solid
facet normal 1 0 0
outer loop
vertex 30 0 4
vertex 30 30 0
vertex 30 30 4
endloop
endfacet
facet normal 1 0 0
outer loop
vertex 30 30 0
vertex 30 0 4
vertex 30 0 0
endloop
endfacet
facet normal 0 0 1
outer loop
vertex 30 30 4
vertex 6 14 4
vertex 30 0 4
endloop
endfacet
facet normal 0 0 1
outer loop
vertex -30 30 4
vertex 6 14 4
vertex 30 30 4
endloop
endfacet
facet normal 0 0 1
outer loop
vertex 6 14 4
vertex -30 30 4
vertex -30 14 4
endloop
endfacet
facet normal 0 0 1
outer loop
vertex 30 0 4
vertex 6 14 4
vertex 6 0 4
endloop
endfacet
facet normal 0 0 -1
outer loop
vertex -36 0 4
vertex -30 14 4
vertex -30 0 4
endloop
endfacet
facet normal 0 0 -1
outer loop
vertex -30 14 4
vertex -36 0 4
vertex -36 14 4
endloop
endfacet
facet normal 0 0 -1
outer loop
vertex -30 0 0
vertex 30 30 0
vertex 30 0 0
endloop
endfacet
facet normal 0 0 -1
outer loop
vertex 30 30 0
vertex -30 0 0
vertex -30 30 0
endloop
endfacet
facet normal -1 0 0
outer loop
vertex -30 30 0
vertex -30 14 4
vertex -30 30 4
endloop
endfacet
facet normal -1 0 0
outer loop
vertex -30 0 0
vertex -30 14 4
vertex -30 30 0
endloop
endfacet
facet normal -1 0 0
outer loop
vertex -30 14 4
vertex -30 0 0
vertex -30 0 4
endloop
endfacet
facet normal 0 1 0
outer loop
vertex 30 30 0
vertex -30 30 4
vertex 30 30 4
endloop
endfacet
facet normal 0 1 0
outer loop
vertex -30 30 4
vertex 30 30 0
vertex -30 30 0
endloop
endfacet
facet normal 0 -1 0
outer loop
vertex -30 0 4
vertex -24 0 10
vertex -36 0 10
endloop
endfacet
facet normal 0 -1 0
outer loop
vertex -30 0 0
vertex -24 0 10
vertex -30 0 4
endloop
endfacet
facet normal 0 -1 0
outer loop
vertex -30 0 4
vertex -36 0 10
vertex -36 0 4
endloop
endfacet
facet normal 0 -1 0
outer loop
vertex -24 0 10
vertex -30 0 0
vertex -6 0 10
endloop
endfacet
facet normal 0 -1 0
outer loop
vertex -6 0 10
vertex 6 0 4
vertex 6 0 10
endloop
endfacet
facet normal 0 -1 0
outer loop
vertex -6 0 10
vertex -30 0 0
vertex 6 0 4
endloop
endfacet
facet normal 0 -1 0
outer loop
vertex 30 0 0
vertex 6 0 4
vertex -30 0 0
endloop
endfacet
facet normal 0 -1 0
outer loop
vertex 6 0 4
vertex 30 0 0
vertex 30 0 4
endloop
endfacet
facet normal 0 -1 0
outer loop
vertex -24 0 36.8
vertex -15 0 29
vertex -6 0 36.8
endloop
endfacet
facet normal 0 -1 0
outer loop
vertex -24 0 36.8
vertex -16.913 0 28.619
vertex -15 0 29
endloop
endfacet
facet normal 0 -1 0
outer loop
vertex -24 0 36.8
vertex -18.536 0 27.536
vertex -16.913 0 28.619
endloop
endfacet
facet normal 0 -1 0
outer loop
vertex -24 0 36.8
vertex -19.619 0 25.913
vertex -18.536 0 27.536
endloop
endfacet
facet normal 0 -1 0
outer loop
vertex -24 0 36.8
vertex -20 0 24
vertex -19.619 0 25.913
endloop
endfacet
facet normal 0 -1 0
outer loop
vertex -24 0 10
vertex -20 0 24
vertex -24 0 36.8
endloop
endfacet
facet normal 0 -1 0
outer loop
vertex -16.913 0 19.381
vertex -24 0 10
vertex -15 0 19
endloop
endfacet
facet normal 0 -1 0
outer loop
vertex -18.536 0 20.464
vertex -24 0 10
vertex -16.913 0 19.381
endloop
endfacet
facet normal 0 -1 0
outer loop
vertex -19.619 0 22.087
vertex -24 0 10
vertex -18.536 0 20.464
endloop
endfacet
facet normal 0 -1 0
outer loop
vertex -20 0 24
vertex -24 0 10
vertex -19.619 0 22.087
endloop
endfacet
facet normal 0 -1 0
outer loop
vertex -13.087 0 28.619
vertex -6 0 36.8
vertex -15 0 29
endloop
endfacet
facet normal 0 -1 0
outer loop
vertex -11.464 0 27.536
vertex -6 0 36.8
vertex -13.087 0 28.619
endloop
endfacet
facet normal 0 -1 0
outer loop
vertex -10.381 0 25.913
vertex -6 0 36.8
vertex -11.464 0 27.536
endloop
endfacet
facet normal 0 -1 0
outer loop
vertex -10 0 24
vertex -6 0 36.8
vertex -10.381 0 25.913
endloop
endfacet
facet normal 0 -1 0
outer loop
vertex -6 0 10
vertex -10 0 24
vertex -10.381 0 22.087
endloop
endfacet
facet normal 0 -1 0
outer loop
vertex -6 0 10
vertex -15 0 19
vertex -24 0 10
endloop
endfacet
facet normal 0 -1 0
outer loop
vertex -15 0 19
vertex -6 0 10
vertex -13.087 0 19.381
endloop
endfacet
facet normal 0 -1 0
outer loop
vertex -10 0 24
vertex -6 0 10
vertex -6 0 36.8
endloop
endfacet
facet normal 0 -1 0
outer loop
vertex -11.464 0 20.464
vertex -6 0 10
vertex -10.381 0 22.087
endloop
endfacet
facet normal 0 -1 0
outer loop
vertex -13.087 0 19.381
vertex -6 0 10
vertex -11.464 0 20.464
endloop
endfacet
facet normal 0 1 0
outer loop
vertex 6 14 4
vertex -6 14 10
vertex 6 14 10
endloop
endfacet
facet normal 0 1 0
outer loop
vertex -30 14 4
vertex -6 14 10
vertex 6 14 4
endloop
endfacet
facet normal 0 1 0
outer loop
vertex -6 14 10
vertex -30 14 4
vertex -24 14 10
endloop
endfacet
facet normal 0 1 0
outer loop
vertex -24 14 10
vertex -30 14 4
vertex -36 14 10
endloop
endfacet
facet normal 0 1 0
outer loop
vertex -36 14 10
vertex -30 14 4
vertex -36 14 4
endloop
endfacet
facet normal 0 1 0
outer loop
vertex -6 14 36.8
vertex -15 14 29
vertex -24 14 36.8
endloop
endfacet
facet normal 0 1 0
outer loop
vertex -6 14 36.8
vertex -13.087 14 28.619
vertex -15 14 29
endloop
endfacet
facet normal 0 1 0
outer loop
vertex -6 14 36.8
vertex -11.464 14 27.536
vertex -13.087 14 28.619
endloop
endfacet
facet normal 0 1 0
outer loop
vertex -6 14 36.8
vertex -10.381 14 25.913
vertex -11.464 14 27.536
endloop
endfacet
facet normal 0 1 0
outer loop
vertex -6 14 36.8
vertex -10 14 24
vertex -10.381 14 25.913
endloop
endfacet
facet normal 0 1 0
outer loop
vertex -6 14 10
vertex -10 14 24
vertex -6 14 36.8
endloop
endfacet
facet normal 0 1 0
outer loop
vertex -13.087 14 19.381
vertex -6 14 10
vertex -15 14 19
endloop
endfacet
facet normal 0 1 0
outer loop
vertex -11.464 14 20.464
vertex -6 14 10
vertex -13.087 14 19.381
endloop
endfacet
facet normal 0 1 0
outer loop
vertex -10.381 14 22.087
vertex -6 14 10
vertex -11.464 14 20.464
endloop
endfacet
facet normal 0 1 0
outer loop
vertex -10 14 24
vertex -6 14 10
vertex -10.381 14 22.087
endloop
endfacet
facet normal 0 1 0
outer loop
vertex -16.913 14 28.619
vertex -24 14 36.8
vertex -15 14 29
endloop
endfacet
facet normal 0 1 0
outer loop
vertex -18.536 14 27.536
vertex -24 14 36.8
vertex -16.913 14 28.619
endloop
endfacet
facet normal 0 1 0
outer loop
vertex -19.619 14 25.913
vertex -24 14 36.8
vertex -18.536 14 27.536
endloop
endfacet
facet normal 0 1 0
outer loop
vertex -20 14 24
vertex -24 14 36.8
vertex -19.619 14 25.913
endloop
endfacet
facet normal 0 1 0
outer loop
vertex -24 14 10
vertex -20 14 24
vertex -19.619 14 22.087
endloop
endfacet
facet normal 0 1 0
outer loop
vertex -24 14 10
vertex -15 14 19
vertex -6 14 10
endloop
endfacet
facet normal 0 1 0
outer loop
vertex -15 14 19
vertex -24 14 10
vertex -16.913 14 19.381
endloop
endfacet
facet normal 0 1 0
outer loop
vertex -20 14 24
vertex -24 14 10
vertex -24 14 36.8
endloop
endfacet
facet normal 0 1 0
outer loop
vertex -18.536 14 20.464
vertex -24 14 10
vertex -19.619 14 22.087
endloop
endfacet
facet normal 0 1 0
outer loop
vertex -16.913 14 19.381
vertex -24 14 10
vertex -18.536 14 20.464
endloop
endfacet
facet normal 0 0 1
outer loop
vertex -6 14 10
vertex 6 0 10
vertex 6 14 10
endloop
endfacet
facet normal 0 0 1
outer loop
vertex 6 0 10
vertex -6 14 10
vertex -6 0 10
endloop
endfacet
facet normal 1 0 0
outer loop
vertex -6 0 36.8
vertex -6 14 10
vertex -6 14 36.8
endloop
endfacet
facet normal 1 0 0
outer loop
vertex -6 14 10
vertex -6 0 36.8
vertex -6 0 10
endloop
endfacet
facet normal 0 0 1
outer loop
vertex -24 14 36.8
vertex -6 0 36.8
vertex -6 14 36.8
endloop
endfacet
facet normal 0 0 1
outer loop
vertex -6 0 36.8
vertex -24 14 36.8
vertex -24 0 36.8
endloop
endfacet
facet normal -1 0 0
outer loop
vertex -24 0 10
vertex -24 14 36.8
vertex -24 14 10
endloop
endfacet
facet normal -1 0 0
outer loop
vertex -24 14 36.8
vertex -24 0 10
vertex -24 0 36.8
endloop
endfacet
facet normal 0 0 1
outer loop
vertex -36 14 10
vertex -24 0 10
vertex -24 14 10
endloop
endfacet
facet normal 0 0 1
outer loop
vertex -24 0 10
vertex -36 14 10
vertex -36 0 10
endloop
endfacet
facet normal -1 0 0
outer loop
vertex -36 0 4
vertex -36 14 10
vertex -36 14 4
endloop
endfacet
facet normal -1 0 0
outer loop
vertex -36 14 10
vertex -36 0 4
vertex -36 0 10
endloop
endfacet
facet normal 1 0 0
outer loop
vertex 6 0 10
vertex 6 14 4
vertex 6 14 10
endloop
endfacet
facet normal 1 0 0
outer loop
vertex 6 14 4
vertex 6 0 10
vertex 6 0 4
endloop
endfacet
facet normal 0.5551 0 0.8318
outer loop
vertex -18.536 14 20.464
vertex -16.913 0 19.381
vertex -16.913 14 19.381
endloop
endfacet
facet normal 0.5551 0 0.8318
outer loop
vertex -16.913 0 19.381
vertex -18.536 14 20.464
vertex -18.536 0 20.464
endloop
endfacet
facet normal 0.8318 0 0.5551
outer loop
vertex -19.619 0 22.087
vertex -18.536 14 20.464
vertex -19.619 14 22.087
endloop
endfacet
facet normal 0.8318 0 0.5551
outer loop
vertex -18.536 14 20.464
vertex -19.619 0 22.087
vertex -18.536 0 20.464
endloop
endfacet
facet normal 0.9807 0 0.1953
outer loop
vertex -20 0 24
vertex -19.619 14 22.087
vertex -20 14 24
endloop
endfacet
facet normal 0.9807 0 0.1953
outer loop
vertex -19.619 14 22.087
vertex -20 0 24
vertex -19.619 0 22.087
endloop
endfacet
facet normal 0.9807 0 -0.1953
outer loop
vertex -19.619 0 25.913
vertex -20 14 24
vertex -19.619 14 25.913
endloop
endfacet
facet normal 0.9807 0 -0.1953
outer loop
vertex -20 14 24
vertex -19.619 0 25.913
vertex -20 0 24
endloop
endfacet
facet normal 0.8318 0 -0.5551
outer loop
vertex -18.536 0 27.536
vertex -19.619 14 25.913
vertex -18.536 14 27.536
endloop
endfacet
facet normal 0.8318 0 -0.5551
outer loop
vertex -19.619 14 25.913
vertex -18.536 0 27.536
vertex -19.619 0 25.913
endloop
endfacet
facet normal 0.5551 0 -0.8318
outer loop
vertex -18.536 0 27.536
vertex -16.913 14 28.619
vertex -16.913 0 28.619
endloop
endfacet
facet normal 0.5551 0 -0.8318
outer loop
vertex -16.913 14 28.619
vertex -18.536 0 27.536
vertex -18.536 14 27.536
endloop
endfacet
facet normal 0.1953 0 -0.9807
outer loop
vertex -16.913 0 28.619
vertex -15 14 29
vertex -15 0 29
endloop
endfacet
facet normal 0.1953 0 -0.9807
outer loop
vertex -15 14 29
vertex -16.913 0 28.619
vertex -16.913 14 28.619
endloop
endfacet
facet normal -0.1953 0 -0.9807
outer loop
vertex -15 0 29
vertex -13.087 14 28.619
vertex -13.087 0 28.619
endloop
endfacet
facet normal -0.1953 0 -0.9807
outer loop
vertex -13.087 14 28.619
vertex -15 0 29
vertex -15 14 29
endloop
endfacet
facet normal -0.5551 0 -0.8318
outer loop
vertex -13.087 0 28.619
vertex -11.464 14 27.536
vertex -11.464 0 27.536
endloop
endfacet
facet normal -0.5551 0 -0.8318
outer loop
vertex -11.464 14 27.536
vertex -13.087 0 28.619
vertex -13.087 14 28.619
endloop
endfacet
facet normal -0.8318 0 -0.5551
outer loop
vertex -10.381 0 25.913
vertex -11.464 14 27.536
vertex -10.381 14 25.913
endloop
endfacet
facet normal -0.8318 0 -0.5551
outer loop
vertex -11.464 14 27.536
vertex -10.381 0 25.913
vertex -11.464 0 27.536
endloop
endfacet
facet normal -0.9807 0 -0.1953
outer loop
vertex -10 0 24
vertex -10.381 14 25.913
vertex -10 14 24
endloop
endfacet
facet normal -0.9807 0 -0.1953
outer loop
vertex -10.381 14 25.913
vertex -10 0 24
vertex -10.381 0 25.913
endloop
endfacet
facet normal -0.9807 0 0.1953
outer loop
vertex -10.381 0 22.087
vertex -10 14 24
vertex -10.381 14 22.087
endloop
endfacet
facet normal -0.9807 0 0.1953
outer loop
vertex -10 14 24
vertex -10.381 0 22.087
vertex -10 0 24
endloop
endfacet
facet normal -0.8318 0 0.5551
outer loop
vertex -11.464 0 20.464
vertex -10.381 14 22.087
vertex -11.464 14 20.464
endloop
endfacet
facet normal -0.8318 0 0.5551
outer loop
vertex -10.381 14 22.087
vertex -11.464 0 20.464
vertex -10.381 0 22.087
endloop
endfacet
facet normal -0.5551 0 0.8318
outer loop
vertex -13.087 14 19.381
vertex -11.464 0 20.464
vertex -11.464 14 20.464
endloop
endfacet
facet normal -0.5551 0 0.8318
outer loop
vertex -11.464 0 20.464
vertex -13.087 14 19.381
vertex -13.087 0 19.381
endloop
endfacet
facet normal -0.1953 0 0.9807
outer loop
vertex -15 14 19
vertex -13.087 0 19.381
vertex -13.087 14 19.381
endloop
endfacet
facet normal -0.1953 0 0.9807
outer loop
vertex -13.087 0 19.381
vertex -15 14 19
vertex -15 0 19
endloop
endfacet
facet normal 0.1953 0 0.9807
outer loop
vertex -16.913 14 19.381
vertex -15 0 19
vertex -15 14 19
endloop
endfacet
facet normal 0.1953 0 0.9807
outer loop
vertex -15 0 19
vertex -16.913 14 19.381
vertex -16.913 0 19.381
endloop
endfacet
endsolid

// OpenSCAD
// file: library/Profile30.scad
// project		: mT-101
// parts 		: profile (profile30_width 30mm)
// printable 	: yes

// author 		: vincent
// date   		: 6.20.2013

// www.metarobotics.com
// It is licensed under the Creative Commons - GNU GPL license.

profile30_width=30;

//simple usage
//profile30(length=100,female=false);

module profile30_inner_slice()
{
	w1=10.3;
	w2=6.3;
	height=10.5;
	margin_corner=3;
	marginy=2;

	margin2 = (w1-w2)/2;
	array1=[[0,height],[0,height-marginy],[margin2,height-marginy],[margin2,height]];
	array2=[[w1,height],[w1,height-marginy],[w1-margin2,height-marginy],[w1-margin2,height]];

	difference()
	{
		polygon(points=[[0,0],[w1,0],[w1,height],[0,height]]);
		polygon(points=[[0,0],[0,margin_corner],[margin_corner,0]]);
		polygon(points=[[w1,0],[w1,margin_corner],[w1-margin_corner,0]]);
		polygon(points=array1);
		polygon(points=array2);
	}
}

module profile_slice30(length=100,female=true)
{
	inner_w=20;
	hole_dia=3;
	center_dia=5;

	margin1=(profile30_width-inner_w)/2;
	margin2=4;
	inner_slice_w=10.3;
	inner_slice_h=10.5;
	socket_length=6;

	translate([-profile30_width/2,-profile30_width/2,0])
	linear_extrude(height=length,center=true)
	difference()
	{
		square(profile30_width,profile30_width);
		translate([profile30_width/2-inner_slice_w/2,profile30_width-inner_slice_h,0]) profile30_inner_slice();
		translate([inner_slice_h,profile30_width/2-inner_slice_w/2,0]) rotate([0,0,90]) profile30_inner_slice();
		translate([profile30_width-inner_slice_w,inner_slice_h,0]) rotate([0,0,180]) profile30_inner_slice();
		translate([profile30_width-inner_slice_h,profile30_width/2+inner_slice_w/2,0]) rotate([0,0,270]) profile30_inner_slice();

		//hole
		translate([margin1,margin1]) circle(r=hole_dia);
		translate([margin1,profile30_width-margin1]) circle(r=hole_dia);
		translate([profile30_width-margin1,margin1]) circle(r=hole_dia);
		translate([profile30_width-margin1,profile30_width-margin1]) circle(r=hole_dia);
		translate([profile30_width/2,profile30_width/2]) circle(r=center_dia/2);
	}

	if(female==false)
	{
		//socket
		translate([-profile30_width/2,-profile30_width/2,length/2])
		difference()
		{
			union()
			{
				linear_extrude(height=2*socket_length,center=true)
				union()
				{
					translate([margin1,margin1]) circle(r=hole_dia);
					translate([margin1,profile30_width-margin1]) circle(r=hole_dia);
					translate([profile30_width-margin1,margin1]) circle(r=hole_dia);
					translate([profile30_width-margin1,profile30_width-margin1]) circle(r=hole_dia);
				}

				translate([0,0,socket_length])
				union()
				{
					translate([margin1,margin1]) cylinder(h=socket_length/2,r1=hole_dia,r2=hole_dia/2);
					translate([margin1,profile30_width-margin1]) cylinder(h=socket_length/2,r1=hole_dia,r2=hole_dia/2);
					translate([profile30_width-margin1,margin1]) cylinder(h=socket_length/2,r1=hole_dia,r2=hole_dia/2);
					translate([profile30_width-margin1,profile30_width-margin1]) cylinder(h=socket_length/2,r1=hole_dia,r2=hole_dia/2);
				}
			}

			translate([0,0,-socket_length-0.01])
			union()
			{
				translate([margin1,margin1]) cylinder(h=socket_length/2,r1=hole_dia,r2=hole_dia/2);
				translate([margin1,profile30_width-margin1]) cylinder(h=socket_length/2,r1=hole_dia,r2=hole_dia/2);
				translate([profile30_width-margin1,margin1]) cylinder(h=socket_length/2,r1=hole_dia,r2=hole_dia/2);
				translate([profile30_width-margin1,profile30_width-margin1]) cylinder(h=socket_length/2,r1=hole_dia,r2=hole_dia/2);
			}
		}
	}
}

module profile30(length=100,female=true,isPrintable=true) {
	$fa = 1;
	$fn = 40;
	profile_slice30(length=length,female=female);
}
// file: library/linearShaft.scad
module linearShaft( h, r )
{
	cylinder( h=h,r=r, center=true );
}
// file: frame/assembleProfile.scad
// project		: mT-101
// printable 	: yes

// assembles parts
// profile30 height=10 * 6 * 4;
// profile_L_bracket=15;

// author 		: vincent
// date   		: 6.20.2013

// www.metarobotics.com
// It is licensed under the Creative Commons - GNU GPL license.

include <../library/Profile30.scad>

//factors
profile_length=100;
apart_factor = 0.01;

bottom_length_x = 600;
bottom_length_y = 600;
bottom_length_z = 600;

module zaxes(apart=false)
{
	union()
	{
		translate([-profile30_width/2,profile30_width/2,profile_length/2])
		bottom_z_profiles(apart);

		translate([-profile30_width/2,profile30_width*1.5+bottom_length_y,profile_length/2])
		bottom_z_profiles(apart);

		translate([profile30_width/2+bottom_length_x,profile30_width/2,profile_length/2])
		bottom_z_profiles(apart);

		translate([profile30_width/2+bottom_length_x,profile30_width*1.5+bottom_length_y,profile_length/2])
		bottom_z_profiles(apart);
	}	
}

module bottom_profiles(apart=false)
{
	union()
	{
		translate([profile_length/2,profile30_width/2,profile30_width/2])
		bottom_x_profiles(apart);

		translate([profile_length/2,profile30_width*1.5+bottom_length_y,profile30_width/2])
		bottom_x_profiles(apart);

		translate([-profile30_width/2,profile30_width*2.5,profile30_width/2])
		bottom_y_profiles(apart);

		translate([bottom_length_x+profile30_width/2,profile30_width*2.5,profile30_width/2])
		bottom_y_profiles(apart);
	}
}

module bottom_z_profiles(apart=false)
{
	profile_z_count = bottom_length_z / profile_length;

	distance = (apart==true) ? profile_length + apart_factor : profile_length;
	isFemale = false;

	if(apart==true)
	{
		assign(distance = distance + apart_factor)
		{
			connect_profiles(distance,profile_z_count,isFemale);
		}
	}
	else
	{
		connect_profiles(distance,profile_z_count,isFemale);
	}
}

module bottom_x_profiles(apart=false)
{
	profile_x_count = bottom_length_x / profile_length;

	distance = (apart==true) ? profile_length + apart_factor : profile_length;
	isFemale = false;

	if(apart==true)
	{
		assign(distance = distance + apart_factor)
		{
			connect_profiles(distance,profile_x_count,isFemale,rotatey=90);
		}
	}
	else
	{
		connect_profiles(distance,profile_x_count,isFemale,rotatey=90);
	}
}

module bottom_y_profiles(apart=false)
{
	profile_y_count = bottom_length_y / profile_length;

	distance = (apart==true) ? profile_length + apart_factor : profile_length;
	isFemale = false;

	if(apart==true)
	{
		assign(distance = distance + apart_factor)
		{
			connect_profiles(distance,profile_y_count,isFemale,rotatex=90);
		}
	}
	else
	{
		connect_profiles(distance,profile_y_count,isFemale,rotatex=90);
	}
}

module connect_profiles(distance,count,isFemale,rotatex=0,rotatey=0)
{
	rotatez=0;

	for( i = [0:count-1] )
	{
		if( i==count-1 )
		{
			assign(isFemale = true)
			{
				if(rotatey>0)
				{
					translate([distance*i,0,0])
					rotate([rotatex,rotatey,rotatez])
					profile30(length=profile_length,female=isFemale);
				}
				else if(rotatex>0)
				{
					translate([0,distance*i,0])
					rotate([rotatex,rotatey,rotatez])
					profile30(length=profile_length,female=isFemale);
				}
				else
				{
					translate([0,0,distance*i])
					profile30(length=profile_length,female=isFemale);
				}
			}
		}
		else
		{
			if(rotatey>0)
			{
				translate([distance*i,0,0])
				rotate([rotatex,rotatey,rotatez])
				profile30(length=profile_length,female=isFemale);
			}
			else if(rotatex>0)
			{
				translate([0,distance*i,0])
				rotate([rotatex,rotatey,rotatez])
				profile30(length=profile_length,female=isFemale);
			}
			else
			{
				translate([0,0,distance*i])
				profile30(length=profile_length,female=isFemale);
			}
		}
	}
}

module assembleProfile(isPrintable=false,apart=false)
{
	if(isPrintable)
	{

	}
	else
	{
		bottom_profiles(apart=apart);

		translate([0,0,bottom_length_z-profile30_width])
		bottom_profiles(apart=apart);

		zaxes(apart);
	}
}

//simple usage
//assembleProfile(apart=true);
// main file
include <frame/assembleProfile.scad>
include <library/linearShaft.scad>

width = 600;
y_axis_rail_offset_z = 20;

shaftsupportmodule();

//assembly();

module assembly()
{
	translate([0,30,0])
	guidepanel();

	translate([0,30,600])
	guidepanel();

	assembleProfile(apart=true);
	y_axis_rails();
	x_axis_rails();
}


module x_axis_rails()
{
	thickness=4;

	offset_z = 50;
	offset_y = shaft_support_width;
	sample_pos_y = 100;
	sample_pos_x = 150;

	pos_connector_y = 15;
	pos_connector_z = 0;

	carriage_width=150;
	carriage_height=60;
	carriage_depth=60;

	positions_rails = [ [0,0,0],[0,offset_y,0] ];
	positions_connector = [ [0,pos_connector_y,pos_connector_z],[width-shaft_support_depth,pos_connector_y,pos_connector_z] ];

	translate( [0,sample_pos_y,width] )
	{
		//rail
		translate([width/2,30,offset_z])
		{
			for( i = positions_rails )
			{
				translate(i)
				rotate([90,90,90])
				rod600();	
			}
		}

		//LM10UU linear bearing
		translate([-15,thickness+pos_connector_y,20])
		union()
		{
			translate([0,29,0])
			LM10UU();

			translate([0,carriage_width-shaft_support_height*2,0])
			LM10UU();

			translate([width+30,29,0])
			LM10UU();

			translate([width+30,carriage_width-shaft_support_height*2,0])
			LM10UU();
		}

		//support block
		for( i = positions_connector )
		{
			translate(i)
			carriage_support_block();
		}

		/*
		//carriage
		translate([sample_pos_x,pos_connector_y,pos_connector_z])
		cube([carriage_width,carriage_height,carriage_depth]);
		*/
	}
}

module carriage_support_block()
{
	width=shaft_support_depth;
	height=shaft_support_width*2;
	depth=shaft_support_height;

	thickness=4;

	//todo:add m5 hexa nut hole
	color("MediumVioletRed")
	{
		difference()
		{
			cube([width,height+thickness*2,depth+thickness*2]);

			translate([-0.1,thickness,thickness])
			cube([width+0.2,height,depth]);
		}
	}

	//shaft support
	color("Silver")
	{
		translate([0,shaft_support_width/2 + thickness, shaft_support_height + thickness])
		union()
		{
			translate([0,0,0])
			rotate([0,180,90])
			shaftsupport();

			translate([0,shaft_support_width,0])
			rotate([0,180,90])
			shaftsupport();
		}
	}
}


/*
	Y-Axis rails
	Designed by vincent
	6.25.2012
*/

module y_axis_rails()
{
	//10mm width rails
	positions = [ [0,0,width],[30+width,0,width] ];
	translate([-15,30+width/2,y_axis_rail_offset_z+5])
	{
		//positions = [ [0,0,0],[0,width,0],[0,0,width],[0,width,width] ];
		for( i = positions )
		{
			translate(i)
			rotate([90,90,0])
			rod600();
		}
	}

	//shaft support
	shaftsupportmodules();
}


module rod600()
{
	color("LimeGreen")
	linearShaft(h=600,r=5);
}

module guidepanel()
{
	color("Moccasin")
	cube([600,600,1]);
}

module shaftsupportmodules()
{
	{
		translate([0,30,600])
		rotate([0,90,0])
		shaftsupportmodule();

		translate([630,30,600])
		rotate([0,-90,0])
		shaftsupportmodule();

		translate([0,630-14,600])
		rotate([0,90,0])
		shaftsupportmodule();

		translate([630,630-14,600])
		rotate([0,-90,0])
		shaftsupportmodule();
	}
}

module shaftsupportmodule()
{
	thickness = 4;

	//printable parts
	color("Coral")
	{
		translate([-30,0,0])
		cube([60,30,thickness]);

		//translate([0,0,0])
		//cube([30,60,4]);
	}

	translate([-15,shaft_support_depth,thickness])
	shaftsupport();
}


//non-printable
//parts::Linear shaft support
//http://www.ebay.com/itm/4pcs-SK10-SH10A-Linear-Rail-Shaft-Support-XYZ-Table-CNC-/290562135602?pt=LH_DefaultDomain_15&hash=item43a6da5632
shaft_support_width=42;
shaft_support_height=32.8;
shaft_support_depth=14;
shaft_support_base_height=6;
shaft_support_center_width=18;
shaft_support_hole_width=5;
shaft_support_hole_height=20;

module shaftsupport()
{
	pos_x = (shaft_support_width-shaft_support_center_width)/2;

	translate([-shaft_support_width/2,0,0])
	{
		color("DarkRed")
		rotate([90,0,0])
		linear_extrude(height=shaft_support_depth)
		difference()
		{
			union()
			{
				square([shaft_support_width,shaft_support_base_height]);

				translate([pos_x,0,0])
				square([shaft_support_center_width,shaft_support_height]);
			}

			translate([shaft_support_width/2,shaft_support_hole_height,0])
			circle(shaft_support_hole_width);
		}
	}
}

//linear ball bearing
//LM10UU
//http://www.ebay.com/itm/10pcs-LM10UU-10mm-Linear-Ball-Bearing-Bush-Bushing-/300629832385?pt=BI_Heavy_Equipment_Parts&hash=item45feef32c1
module LM10UU()
{
	outer_diameter=9.5;
	inscribed_circle=5;
	length=29;

	translate([0,0,outer_diameter/2])
	rotate([90,0,0])
	linear_extrude(height=length)
	difference()
	{
		circle(outer_diameter,center=true);
		circle(inscribed_circle,center=true);
	}
}
